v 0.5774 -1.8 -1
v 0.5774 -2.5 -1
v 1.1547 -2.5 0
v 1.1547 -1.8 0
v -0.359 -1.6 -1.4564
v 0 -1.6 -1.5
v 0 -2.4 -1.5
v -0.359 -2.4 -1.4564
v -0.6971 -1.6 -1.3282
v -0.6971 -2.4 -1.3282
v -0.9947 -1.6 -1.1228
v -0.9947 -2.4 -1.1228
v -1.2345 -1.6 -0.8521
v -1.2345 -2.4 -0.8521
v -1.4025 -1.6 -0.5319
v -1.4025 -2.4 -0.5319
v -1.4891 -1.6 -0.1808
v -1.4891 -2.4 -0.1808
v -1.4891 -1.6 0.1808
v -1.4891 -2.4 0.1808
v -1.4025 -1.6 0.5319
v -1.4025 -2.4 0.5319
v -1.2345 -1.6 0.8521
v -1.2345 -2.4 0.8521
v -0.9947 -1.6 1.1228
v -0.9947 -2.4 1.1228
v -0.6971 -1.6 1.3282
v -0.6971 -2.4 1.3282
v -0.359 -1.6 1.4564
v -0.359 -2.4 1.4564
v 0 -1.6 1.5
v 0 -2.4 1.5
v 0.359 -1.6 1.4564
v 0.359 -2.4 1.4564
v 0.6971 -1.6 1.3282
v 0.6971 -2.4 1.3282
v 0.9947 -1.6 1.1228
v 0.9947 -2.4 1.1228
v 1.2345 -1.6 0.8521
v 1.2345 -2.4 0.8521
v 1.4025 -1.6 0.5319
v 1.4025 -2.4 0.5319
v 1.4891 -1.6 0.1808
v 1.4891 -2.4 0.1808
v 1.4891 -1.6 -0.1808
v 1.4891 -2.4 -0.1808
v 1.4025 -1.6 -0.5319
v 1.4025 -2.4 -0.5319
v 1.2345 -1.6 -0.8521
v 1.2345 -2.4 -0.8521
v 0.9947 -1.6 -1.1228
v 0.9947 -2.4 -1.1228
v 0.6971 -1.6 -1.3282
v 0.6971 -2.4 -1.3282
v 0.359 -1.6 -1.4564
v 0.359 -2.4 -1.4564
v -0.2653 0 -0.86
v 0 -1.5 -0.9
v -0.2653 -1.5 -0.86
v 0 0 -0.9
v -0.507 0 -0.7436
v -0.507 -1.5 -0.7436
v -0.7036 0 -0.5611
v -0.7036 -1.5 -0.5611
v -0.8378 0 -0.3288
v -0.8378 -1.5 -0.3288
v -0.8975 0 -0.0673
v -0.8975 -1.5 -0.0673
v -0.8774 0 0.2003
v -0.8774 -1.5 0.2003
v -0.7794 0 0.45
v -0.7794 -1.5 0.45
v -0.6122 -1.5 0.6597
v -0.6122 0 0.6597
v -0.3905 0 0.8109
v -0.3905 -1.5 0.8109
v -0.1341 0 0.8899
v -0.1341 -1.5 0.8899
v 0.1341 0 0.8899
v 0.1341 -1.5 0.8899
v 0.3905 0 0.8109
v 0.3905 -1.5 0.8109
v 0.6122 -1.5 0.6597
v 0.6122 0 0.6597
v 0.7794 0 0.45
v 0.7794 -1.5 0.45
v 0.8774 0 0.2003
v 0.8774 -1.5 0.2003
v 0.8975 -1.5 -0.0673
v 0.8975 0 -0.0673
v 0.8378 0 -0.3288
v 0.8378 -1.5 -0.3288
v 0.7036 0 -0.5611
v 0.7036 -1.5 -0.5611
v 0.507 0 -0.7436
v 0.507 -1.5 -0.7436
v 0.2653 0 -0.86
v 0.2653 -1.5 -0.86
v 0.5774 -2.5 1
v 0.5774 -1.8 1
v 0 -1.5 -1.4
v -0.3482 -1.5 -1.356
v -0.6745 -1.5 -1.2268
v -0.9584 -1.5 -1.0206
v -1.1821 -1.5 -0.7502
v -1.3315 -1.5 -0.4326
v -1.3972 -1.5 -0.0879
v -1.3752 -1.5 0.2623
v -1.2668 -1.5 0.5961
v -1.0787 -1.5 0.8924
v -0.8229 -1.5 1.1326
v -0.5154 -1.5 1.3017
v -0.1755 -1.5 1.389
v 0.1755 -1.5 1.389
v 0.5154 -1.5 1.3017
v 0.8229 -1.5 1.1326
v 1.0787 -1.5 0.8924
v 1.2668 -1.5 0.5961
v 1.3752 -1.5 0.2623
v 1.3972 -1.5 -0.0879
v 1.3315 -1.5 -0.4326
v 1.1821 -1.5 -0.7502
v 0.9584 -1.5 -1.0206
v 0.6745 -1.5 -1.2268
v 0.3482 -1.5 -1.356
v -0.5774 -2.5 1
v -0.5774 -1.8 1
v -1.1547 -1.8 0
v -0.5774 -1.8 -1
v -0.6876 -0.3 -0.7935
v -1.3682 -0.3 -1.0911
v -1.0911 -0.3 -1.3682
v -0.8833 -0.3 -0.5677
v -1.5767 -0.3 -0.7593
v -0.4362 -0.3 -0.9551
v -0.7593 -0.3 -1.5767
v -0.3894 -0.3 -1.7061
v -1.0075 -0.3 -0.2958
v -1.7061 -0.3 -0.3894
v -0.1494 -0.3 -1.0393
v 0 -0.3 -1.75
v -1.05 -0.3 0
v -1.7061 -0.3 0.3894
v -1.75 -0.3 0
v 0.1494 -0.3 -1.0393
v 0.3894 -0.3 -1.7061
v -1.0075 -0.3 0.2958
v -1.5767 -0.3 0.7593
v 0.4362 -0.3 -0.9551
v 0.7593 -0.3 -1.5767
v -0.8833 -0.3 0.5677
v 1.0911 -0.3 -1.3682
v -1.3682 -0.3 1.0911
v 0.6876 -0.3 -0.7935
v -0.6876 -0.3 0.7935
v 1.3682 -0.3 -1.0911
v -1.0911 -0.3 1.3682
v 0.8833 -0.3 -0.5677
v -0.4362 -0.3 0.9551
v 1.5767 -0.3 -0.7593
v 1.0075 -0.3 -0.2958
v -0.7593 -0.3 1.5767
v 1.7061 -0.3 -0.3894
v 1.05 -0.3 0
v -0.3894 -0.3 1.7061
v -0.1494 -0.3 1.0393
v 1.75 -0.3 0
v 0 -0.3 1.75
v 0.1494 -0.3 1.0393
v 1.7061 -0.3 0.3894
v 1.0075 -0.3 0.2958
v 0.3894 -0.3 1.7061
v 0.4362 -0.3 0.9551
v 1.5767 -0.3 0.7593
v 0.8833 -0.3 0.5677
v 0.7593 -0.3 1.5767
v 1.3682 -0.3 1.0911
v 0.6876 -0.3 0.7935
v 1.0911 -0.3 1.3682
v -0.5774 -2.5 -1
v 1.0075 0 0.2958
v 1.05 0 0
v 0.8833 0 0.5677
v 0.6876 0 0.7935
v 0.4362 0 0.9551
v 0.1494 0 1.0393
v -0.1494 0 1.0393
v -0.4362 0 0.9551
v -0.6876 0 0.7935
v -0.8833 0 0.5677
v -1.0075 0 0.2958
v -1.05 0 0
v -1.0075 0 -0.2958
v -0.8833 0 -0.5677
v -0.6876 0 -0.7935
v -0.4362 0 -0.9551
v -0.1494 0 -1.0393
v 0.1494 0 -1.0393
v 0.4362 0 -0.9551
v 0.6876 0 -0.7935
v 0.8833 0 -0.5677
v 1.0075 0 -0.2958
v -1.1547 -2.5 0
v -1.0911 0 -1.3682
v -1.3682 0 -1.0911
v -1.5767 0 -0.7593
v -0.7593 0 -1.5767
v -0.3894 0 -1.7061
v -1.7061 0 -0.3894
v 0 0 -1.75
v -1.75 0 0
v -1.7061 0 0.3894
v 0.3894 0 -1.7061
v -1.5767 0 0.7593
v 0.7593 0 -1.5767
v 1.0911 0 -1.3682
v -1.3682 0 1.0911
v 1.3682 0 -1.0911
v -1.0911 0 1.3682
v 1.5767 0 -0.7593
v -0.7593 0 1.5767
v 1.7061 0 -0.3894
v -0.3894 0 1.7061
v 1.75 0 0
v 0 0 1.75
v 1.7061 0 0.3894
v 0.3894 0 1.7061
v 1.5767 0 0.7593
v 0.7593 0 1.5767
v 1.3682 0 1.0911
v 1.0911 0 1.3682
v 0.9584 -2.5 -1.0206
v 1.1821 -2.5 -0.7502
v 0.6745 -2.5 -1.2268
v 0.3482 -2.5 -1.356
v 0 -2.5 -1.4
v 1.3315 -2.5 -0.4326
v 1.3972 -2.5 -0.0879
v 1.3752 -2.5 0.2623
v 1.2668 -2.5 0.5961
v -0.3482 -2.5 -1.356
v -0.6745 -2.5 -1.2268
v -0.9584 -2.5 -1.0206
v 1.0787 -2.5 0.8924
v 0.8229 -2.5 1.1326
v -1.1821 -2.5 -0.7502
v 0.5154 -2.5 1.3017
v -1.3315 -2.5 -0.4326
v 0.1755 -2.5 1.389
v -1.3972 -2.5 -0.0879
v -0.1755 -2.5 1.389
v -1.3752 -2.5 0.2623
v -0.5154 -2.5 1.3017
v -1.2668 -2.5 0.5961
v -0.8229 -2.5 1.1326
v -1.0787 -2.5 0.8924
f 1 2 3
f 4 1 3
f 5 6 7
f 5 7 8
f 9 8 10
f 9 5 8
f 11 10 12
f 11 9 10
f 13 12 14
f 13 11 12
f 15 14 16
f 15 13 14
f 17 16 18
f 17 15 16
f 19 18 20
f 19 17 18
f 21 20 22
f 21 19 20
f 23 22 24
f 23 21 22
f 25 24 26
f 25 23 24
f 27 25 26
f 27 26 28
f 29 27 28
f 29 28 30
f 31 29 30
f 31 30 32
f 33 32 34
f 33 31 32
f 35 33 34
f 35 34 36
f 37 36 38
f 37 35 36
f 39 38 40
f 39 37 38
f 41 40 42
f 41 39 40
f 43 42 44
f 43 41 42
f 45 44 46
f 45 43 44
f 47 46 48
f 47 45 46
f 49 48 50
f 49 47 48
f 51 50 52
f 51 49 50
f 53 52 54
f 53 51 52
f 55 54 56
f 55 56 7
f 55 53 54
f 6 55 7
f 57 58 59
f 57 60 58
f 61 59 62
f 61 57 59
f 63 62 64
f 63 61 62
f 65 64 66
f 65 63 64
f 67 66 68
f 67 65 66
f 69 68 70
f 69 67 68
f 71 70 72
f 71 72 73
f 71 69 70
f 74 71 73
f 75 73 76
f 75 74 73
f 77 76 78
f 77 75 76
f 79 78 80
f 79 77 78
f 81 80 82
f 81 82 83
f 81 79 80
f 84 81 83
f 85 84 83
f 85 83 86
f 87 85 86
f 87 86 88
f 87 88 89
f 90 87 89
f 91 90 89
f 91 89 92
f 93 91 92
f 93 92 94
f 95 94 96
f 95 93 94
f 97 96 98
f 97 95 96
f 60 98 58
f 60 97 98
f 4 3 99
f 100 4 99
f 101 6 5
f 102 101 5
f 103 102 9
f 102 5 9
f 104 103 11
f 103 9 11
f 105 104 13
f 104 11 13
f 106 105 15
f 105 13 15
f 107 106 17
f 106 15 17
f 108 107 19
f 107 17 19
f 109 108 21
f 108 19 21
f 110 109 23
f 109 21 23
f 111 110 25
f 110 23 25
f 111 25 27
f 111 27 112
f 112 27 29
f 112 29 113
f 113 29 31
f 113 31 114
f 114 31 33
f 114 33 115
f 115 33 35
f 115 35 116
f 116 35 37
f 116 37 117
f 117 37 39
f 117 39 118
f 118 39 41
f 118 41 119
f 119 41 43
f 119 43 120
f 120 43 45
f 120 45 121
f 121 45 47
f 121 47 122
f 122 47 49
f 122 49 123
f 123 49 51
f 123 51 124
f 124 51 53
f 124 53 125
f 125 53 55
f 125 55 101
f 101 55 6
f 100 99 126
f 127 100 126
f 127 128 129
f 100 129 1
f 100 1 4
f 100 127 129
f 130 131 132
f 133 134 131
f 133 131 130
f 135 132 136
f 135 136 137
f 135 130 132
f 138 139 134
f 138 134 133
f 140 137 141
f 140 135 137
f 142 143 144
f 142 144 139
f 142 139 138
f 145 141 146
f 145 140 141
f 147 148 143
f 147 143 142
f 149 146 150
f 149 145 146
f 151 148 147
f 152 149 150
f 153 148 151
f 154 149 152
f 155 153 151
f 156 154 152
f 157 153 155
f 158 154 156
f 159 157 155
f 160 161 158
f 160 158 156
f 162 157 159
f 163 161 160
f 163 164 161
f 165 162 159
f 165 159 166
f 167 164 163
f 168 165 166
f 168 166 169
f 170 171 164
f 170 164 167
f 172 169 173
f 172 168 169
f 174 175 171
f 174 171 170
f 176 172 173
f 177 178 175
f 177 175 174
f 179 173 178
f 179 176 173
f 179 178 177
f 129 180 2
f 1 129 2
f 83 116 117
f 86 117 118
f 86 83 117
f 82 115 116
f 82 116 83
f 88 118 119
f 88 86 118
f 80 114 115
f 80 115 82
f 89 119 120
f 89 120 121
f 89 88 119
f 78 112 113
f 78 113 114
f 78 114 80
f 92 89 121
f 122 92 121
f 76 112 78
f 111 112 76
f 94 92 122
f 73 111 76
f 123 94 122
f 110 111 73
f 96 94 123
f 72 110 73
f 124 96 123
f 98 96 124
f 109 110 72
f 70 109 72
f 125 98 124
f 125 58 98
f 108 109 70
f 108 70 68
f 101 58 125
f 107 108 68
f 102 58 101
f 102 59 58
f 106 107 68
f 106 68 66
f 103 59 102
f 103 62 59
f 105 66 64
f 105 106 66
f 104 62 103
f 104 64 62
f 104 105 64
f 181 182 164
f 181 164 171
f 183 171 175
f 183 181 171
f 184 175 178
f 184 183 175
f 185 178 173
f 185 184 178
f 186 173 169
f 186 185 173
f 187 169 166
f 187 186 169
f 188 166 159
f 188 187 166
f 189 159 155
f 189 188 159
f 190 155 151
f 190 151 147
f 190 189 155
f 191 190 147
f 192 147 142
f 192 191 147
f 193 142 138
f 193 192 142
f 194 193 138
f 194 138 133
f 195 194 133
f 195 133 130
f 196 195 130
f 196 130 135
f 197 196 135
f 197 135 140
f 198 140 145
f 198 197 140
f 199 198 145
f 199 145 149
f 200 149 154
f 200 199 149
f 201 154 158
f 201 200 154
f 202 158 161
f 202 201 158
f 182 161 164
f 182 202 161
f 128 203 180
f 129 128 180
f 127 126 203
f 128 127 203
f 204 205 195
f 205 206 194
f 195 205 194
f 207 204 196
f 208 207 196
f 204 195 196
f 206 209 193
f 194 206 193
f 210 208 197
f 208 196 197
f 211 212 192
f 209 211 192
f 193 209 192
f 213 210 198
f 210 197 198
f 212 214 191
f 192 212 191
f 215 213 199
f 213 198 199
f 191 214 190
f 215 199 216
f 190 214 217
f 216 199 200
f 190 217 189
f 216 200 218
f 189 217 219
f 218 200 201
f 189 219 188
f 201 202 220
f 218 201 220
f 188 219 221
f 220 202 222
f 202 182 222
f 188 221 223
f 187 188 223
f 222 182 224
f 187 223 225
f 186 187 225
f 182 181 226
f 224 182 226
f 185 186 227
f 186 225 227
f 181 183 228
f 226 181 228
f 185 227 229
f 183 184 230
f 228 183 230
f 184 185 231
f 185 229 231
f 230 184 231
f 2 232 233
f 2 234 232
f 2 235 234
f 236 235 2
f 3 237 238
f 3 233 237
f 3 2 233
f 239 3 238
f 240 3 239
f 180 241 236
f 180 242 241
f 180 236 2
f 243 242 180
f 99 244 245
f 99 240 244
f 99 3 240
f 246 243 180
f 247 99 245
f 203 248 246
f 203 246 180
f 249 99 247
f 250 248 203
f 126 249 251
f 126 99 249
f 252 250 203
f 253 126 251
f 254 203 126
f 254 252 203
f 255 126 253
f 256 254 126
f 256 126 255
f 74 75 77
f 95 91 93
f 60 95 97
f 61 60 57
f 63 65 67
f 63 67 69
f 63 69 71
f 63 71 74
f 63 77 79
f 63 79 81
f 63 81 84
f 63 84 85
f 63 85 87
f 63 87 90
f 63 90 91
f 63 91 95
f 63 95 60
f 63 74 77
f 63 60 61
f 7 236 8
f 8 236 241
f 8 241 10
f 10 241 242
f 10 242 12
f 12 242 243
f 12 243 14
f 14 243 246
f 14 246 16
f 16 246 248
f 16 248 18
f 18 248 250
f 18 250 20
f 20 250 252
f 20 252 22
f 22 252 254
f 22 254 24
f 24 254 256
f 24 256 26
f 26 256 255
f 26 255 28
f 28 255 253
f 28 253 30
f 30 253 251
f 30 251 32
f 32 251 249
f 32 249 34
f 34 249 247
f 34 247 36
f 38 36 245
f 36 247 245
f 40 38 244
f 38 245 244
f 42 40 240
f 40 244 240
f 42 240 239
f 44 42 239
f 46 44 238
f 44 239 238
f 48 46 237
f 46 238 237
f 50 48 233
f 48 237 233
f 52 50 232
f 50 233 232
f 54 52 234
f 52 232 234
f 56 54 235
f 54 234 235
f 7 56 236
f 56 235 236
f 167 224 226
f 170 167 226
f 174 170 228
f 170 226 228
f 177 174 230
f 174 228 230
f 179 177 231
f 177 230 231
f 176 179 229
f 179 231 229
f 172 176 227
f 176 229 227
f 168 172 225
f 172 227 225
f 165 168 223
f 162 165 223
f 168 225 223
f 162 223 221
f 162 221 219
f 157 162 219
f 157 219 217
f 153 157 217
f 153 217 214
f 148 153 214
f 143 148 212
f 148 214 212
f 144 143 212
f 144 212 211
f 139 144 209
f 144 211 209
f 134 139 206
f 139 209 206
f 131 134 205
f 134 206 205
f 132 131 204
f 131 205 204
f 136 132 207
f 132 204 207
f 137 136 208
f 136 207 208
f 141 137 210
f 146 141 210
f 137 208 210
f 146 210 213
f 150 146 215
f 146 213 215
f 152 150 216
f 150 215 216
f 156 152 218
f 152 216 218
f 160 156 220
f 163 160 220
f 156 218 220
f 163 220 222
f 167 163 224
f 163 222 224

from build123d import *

# Parameters (mm, degrees)
F0_R     = 1.75
F0_R_2   = 1.05
F1_DEPTH = 0.3
F5_DEPTH = 0.7
F6_SIZE  = 0.1


with BuildPart() as f1:
    # F0 (on Front) → F1 (new body)
    with BuildSketch(Plane.XZ):
        Circle(F0_R)
        Circle(F0_R_2, mode=Mode.SUBTRACT)
    extrude(amount=F1_DEPTH)


with BuildPart() as f3:
    # F2 (on Right) → F3 (revolve)
    with BuildSketch(Plane.YZ):
        Polygon((0, -0.9), (0, 0), (-2.5, 0), (-2.5, -1.5), (-1.5, -1.5), (-1.5, -0.9), align=None)
    revolve(axis=Axis((0, -0.931411, 0), (0, 1, 0)))

    # F4 (on face) → F5 (cut)
    with BuildSketch(Plane.XZ.offset(2.5)):
        Polygon((1.154701, 0), (0.57735, 1), (-0.57735, 1), (-1.154701, 0), (-0.57735, -1), (0.57735, -1), align=None)
    extrude(amount=-F5_DEPTH, mode=Mode.SUBTRACT)

    # F6
    f6_edges = [f3.edges().sort_by_distance(p)[0] for p in [
        (0, -2.5, 1.5),
        (0, -1.5, 1.5),
    ]]
    chamfer(f6_edges, length=F6_SIZE)


solid = Compound([f1.part, f3.part])
